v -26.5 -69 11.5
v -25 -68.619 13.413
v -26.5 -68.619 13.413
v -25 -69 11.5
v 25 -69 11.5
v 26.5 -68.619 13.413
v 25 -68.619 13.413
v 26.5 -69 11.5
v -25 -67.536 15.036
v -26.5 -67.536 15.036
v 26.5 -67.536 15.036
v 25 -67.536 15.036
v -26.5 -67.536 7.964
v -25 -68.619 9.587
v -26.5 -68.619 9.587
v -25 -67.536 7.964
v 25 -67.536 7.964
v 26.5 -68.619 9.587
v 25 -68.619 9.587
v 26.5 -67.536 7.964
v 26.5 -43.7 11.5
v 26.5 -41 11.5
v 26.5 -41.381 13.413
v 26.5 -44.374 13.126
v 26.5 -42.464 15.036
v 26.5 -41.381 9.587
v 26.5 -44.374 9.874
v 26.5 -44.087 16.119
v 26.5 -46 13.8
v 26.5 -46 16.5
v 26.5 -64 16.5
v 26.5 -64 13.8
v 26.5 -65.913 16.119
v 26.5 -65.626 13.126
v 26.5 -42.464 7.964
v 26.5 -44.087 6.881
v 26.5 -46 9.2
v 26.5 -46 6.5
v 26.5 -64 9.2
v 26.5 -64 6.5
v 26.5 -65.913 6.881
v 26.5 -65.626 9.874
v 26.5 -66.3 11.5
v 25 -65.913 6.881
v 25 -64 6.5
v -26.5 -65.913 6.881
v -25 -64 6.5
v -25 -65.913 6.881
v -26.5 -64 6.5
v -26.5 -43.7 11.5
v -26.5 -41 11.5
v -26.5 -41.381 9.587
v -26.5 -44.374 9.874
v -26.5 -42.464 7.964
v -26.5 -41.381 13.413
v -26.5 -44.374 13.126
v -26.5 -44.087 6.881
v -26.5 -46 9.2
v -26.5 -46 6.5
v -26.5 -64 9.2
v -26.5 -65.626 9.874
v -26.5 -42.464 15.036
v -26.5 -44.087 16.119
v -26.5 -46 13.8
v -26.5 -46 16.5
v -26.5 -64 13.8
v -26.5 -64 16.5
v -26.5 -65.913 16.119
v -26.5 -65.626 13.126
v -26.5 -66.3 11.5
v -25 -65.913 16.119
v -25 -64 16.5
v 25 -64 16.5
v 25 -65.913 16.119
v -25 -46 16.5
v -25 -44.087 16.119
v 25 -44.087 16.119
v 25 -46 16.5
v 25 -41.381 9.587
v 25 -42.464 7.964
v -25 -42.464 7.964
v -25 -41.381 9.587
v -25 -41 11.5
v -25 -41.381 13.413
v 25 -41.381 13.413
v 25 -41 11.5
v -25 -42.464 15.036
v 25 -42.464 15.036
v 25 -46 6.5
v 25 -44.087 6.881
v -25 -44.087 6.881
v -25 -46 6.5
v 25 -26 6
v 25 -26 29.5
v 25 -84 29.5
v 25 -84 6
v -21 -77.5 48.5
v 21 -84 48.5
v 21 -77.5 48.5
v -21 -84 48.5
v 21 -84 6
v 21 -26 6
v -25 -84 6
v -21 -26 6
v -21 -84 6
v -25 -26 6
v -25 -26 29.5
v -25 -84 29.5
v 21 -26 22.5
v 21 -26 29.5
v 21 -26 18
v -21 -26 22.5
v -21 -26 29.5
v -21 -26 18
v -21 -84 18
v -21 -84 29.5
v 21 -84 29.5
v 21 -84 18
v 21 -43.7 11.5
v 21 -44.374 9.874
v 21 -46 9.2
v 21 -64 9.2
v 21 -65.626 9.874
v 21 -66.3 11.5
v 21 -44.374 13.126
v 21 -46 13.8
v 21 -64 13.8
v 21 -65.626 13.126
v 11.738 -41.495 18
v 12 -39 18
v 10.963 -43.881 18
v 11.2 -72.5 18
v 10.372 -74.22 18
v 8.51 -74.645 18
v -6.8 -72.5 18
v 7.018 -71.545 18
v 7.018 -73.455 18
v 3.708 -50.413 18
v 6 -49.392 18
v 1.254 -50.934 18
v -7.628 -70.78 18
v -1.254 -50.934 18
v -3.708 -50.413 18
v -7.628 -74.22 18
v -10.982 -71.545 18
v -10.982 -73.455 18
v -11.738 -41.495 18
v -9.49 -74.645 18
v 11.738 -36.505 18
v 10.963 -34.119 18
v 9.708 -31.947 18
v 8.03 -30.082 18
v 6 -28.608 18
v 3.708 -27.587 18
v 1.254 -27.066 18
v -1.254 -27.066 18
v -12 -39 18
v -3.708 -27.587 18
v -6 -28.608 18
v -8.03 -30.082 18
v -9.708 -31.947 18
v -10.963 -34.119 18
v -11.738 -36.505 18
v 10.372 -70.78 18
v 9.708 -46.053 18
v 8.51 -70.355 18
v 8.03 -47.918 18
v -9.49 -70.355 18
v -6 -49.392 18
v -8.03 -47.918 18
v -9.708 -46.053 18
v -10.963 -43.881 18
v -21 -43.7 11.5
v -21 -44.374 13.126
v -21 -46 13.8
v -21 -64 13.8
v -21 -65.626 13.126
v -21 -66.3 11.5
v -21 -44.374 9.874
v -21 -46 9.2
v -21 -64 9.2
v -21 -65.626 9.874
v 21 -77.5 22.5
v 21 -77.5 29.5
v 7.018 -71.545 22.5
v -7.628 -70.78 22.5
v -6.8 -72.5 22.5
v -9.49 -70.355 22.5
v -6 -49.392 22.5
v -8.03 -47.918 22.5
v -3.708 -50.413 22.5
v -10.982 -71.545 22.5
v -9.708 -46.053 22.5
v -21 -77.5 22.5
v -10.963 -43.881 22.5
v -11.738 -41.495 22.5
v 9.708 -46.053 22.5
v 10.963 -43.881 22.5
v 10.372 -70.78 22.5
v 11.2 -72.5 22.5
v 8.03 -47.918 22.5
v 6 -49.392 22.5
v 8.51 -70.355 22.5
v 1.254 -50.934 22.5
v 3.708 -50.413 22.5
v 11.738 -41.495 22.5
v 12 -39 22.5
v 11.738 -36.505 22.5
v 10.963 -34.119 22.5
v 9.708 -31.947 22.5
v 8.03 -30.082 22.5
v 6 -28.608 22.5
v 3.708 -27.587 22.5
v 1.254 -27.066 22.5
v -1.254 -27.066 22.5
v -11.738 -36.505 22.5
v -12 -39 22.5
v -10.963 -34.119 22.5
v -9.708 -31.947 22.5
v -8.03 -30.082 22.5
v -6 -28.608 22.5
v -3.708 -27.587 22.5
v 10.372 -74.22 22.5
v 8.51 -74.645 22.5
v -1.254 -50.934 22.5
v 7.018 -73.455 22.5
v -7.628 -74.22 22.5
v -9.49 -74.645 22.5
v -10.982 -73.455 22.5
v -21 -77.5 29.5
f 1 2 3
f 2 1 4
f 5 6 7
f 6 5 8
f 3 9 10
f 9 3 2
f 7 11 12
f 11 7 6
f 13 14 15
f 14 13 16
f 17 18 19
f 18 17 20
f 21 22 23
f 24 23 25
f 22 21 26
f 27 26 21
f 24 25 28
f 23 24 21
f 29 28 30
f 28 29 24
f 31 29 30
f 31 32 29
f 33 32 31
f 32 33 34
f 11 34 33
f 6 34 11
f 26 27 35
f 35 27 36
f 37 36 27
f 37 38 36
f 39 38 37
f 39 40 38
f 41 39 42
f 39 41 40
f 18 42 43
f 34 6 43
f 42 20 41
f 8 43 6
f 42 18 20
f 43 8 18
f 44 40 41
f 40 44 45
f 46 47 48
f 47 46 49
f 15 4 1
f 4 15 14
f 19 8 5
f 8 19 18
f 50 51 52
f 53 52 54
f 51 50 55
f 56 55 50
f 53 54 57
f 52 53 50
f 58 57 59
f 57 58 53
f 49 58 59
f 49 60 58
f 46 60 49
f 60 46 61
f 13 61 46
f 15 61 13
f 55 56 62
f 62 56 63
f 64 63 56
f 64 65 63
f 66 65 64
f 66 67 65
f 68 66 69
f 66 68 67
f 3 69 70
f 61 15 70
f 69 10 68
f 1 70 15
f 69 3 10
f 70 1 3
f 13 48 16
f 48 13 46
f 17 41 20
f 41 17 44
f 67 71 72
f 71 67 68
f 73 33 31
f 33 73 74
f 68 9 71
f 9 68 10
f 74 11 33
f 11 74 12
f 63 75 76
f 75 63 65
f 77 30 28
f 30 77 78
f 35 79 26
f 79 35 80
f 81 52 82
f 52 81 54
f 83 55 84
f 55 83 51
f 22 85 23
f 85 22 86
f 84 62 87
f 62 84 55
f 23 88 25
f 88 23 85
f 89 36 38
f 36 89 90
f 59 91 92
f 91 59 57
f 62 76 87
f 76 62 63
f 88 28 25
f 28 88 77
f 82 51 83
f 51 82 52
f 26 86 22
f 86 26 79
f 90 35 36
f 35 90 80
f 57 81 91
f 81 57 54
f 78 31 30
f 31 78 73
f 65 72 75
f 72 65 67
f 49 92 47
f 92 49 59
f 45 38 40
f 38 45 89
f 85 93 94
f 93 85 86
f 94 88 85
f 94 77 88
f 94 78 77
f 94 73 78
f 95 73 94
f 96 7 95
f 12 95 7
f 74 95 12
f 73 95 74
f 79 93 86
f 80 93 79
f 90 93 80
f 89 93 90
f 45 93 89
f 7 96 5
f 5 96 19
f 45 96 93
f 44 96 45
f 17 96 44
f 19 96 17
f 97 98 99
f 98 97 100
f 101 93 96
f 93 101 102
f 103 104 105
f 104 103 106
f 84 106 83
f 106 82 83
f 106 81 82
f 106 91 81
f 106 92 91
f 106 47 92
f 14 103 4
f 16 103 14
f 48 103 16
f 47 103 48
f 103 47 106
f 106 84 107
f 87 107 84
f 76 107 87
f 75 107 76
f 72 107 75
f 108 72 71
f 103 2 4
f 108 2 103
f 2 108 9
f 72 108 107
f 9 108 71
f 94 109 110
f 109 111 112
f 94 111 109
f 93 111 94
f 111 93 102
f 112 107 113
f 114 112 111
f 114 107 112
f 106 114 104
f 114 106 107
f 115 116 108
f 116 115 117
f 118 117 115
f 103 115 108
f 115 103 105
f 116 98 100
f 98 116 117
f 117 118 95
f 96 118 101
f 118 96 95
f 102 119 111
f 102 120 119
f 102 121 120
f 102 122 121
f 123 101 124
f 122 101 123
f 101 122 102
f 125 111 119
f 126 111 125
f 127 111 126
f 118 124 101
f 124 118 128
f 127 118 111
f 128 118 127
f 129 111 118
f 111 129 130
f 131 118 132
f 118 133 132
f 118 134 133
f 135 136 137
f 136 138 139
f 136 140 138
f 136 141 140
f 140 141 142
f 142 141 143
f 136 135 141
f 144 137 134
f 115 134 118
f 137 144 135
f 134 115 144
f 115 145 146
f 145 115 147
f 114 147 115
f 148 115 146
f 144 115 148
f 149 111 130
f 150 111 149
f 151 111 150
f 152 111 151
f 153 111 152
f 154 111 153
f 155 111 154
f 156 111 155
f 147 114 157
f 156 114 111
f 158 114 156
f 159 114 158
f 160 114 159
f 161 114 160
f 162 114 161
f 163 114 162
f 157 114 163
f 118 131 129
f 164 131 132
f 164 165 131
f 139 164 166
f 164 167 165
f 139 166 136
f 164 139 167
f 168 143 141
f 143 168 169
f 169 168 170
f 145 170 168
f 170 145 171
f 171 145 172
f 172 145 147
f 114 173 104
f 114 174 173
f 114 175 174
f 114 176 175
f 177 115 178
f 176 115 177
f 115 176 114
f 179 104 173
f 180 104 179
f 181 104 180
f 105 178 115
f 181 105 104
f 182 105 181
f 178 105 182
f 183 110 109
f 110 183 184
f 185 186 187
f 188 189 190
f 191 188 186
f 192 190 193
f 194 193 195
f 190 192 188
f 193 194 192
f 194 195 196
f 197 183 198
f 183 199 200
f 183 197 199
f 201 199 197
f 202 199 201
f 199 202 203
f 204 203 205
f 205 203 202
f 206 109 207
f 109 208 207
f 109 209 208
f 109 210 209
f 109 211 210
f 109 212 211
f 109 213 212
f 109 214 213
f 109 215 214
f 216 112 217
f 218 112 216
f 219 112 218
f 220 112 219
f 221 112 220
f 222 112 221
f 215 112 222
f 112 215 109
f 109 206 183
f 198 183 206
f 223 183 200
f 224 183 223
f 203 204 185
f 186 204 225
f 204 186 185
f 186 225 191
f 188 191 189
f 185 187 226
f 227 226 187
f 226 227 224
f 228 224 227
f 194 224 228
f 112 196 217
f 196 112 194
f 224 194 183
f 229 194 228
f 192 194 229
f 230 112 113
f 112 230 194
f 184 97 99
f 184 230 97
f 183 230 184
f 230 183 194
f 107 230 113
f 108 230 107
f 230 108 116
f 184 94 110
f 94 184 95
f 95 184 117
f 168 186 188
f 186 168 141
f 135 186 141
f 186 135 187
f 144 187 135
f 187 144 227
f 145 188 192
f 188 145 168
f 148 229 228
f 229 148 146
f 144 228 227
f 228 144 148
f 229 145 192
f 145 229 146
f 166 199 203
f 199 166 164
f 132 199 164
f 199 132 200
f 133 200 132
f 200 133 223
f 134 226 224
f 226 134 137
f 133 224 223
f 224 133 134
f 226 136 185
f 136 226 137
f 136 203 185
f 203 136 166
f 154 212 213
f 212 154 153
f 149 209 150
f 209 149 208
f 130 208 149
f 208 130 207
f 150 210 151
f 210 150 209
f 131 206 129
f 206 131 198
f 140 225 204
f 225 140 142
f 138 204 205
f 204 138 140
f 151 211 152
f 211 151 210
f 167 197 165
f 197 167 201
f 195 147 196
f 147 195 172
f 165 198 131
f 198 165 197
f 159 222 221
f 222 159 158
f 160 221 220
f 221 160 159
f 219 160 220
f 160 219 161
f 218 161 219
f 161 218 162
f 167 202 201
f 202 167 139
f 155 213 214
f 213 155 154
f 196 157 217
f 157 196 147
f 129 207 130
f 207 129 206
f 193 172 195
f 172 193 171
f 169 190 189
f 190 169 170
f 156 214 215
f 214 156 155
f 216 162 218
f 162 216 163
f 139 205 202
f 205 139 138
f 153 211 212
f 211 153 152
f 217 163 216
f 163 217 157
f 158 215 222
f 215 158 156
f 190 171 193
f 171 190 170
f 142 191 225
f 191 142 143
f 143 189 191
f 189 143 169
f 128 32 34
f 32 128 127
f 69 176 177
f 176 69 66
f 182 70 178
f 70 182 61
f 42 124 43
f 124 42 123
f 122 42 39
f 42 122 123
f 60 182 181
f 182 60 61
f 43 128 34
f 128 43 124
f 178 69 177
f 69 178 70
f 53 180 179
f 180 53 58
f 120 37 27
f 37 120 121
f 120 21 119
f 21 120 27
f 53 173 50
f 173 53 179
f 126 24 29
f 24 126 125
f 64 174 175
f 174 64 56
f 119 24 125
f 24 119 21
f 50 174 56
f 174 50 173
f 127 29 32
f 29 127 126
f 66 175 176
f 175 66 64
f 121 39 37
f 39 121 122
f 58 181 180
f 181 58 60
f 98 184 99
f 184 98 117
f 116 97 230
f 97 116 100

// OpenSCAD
// CSG file generated from FreeCAD 0.18.4 (GitTag)
module EAF() group() {
 group(){
difference() {
union() {
multmatrix([[2.220446049250313e-16, 0.0, 1.0,            -26.5], [0.0, 1.0, 0.0, -64.0], [-1.0, 0.0, 2.220446049250313e-16, 11.5], [             0, 0, 0, 1]]){
cylinder($fn = 0, $fa = 12.000000, $fs = 2.000000, h = 53.0, r1 = 5.0, r2 = 5.0, center = false);
}
multmatrix([[2.220446049250313e-16, 0.0, 1.0,            -26.5], [0.0, 1.0, 0.0, -46.0], [-1.0, 0.0, 2.220446049250313e-16, 11.5], [             0, 0, 0, 1]]){
cylinder($fn = 0, $fa = 12.000000, $fs = 2.000000, h = 53.0, r1 = 5.0, r2 = 5.0, center = false);
}
multmatrix([[1.0, 0.0, 0.0,            -26.5], [0.0, 1.0, 0.0, -64.0], [0.0, 0.0, 1.0, 6.5], [             0, 0, 0, 1]]){
cube (size = [53.0, 18.0, 10.0], center = false);
}
multmatrix([[1.0, 0.0, 0.0,            -25.0], [0.0, 1.0, 0.0, -84.0], [0.0, 0.0, 1.0, 6.0], [             0, 0, 0, 1]]){
cube (size = [50.0, 58.0, 42.5], center = false);
}
}
union() {
multmatrix([[1.0, 0.0, 0.0,            -21.0], [0.0, 1.0, 0.0, -84.0], [0.0, 0.0, 1.0, 5.5], [             0, 0, 0, 1]]){
cube (size = [42.0, 58.0, 12.5], center = false);
}
multmatrix([[1.0, 0.0, 0.0,            -21.0], [0.0, 1.0, 0.0, -77.5], [0.0, 0.0, 1.0, 22.5], [             0, 0, 0, 1]]){
cube (size = [42.0, 58.0, 26.0], center = false);
}
multmatrix([[1.0, 0.0, 0.0,            -25.0], [0.0, 1.0, 0.0, -77.5], [0.0, 0.0, 1.0, 29.5], [             0, 0, 0, 1]]){
cube (size = [50.0, 58.0, 19.5], center = false);
}
multmatrix([[1.0, 0.0, 0.0,            -9.0], [0.0, 1.0, 0.0, -72.5], [0.0, 0.0, 1.0, 0.0], [             0, 0, 0, 1]]){
cylinder($fn = 0, $fa = 12.000000, $fs = 2.000000, h = 24.0, r1 = 2.2, r2 = 2.2, center = false);
}
multmatrix([[1.0, 0.0, 0.0,            9.0], [0.0, 1.0, 0.0, -72.5], [0.0, 0.0, 1.0, 0.0], [             0, 0, 0, 1]]){
cylinder($fn = 0, $fa = 12.000000, $fs = 2.000000, h = 24.0, r1 = 2.2, r2 = 2.2, center = false);
}
multmatrix([[1.0, 0.0, 0.0,            0.0], [0.0, 1.0, 0.0, -39.0], [0.0, 0.0, 1.0, 0.0], [             0, 0, 0, 1]]){
cylinder($fn = 0, $fa = 12.000000, $fs = 2.000000, h = 24.0, r1 = 12.0, r2 = 12.0, center = false);
}
multmatrix([[2.220446049250313e-16, 0.0, 1.0,            -26.5], [0.0, 1.0, 0.0, -64.0], [-1.0, 0.0, 2.220446049250313e-16, 11.5], [             0, 0, 0, 1]]){
cylinder($fn = 0, $fa = 12.000000, $fs = 2.000000, h = 53.0, r1 = 2.3, r2 = 2.3, center = false);
}
multmatrix([[2.220446049250313e-16, 0.0, 1.0,            -26.5], [0.0, 1.0, 0.0, -46.0], [-1.0, 0.0, 2.220446049250313e-16, 11.5], [             0, 0, 0, 1]]){
cylinder($fn = 0, $fa = 12.000000, $fs = 2.000000, h = 53.0, r1 = 2.3, r2 = 2.3, center = false);
}
multmatrix([[1.0, 0.0, 0.0,            -26.5], [0.0, 1.0, 0.0, -64.0], [0.0, 0.0, 1.0, 9.2], [             0, 0, 0, 1]]){
cube (size = [53.0, 18.0, 4.6], center = false);
}
multmatrix([[1.0, 0.0, 0.0,            21.0], [0.0, 1.0, 0.0, -84.0], [0.0, 0.0, 1.0, 29.5], [             0, 0, 0, 1]]){
cube (size = [4.0, 6.5, 19.0], center = false);
}
multmatrix([[1.0, 0.0, 0.0,            -25.0], [0.0, 1.0, 0.0, -84.0], [0.0, 0.0, 1.0, 29.5], [             0, 0, 0, 1]]){
cube (size = [4.0, 6.5, 19.0], center = false);
}
}
}
}
}

EAF();
